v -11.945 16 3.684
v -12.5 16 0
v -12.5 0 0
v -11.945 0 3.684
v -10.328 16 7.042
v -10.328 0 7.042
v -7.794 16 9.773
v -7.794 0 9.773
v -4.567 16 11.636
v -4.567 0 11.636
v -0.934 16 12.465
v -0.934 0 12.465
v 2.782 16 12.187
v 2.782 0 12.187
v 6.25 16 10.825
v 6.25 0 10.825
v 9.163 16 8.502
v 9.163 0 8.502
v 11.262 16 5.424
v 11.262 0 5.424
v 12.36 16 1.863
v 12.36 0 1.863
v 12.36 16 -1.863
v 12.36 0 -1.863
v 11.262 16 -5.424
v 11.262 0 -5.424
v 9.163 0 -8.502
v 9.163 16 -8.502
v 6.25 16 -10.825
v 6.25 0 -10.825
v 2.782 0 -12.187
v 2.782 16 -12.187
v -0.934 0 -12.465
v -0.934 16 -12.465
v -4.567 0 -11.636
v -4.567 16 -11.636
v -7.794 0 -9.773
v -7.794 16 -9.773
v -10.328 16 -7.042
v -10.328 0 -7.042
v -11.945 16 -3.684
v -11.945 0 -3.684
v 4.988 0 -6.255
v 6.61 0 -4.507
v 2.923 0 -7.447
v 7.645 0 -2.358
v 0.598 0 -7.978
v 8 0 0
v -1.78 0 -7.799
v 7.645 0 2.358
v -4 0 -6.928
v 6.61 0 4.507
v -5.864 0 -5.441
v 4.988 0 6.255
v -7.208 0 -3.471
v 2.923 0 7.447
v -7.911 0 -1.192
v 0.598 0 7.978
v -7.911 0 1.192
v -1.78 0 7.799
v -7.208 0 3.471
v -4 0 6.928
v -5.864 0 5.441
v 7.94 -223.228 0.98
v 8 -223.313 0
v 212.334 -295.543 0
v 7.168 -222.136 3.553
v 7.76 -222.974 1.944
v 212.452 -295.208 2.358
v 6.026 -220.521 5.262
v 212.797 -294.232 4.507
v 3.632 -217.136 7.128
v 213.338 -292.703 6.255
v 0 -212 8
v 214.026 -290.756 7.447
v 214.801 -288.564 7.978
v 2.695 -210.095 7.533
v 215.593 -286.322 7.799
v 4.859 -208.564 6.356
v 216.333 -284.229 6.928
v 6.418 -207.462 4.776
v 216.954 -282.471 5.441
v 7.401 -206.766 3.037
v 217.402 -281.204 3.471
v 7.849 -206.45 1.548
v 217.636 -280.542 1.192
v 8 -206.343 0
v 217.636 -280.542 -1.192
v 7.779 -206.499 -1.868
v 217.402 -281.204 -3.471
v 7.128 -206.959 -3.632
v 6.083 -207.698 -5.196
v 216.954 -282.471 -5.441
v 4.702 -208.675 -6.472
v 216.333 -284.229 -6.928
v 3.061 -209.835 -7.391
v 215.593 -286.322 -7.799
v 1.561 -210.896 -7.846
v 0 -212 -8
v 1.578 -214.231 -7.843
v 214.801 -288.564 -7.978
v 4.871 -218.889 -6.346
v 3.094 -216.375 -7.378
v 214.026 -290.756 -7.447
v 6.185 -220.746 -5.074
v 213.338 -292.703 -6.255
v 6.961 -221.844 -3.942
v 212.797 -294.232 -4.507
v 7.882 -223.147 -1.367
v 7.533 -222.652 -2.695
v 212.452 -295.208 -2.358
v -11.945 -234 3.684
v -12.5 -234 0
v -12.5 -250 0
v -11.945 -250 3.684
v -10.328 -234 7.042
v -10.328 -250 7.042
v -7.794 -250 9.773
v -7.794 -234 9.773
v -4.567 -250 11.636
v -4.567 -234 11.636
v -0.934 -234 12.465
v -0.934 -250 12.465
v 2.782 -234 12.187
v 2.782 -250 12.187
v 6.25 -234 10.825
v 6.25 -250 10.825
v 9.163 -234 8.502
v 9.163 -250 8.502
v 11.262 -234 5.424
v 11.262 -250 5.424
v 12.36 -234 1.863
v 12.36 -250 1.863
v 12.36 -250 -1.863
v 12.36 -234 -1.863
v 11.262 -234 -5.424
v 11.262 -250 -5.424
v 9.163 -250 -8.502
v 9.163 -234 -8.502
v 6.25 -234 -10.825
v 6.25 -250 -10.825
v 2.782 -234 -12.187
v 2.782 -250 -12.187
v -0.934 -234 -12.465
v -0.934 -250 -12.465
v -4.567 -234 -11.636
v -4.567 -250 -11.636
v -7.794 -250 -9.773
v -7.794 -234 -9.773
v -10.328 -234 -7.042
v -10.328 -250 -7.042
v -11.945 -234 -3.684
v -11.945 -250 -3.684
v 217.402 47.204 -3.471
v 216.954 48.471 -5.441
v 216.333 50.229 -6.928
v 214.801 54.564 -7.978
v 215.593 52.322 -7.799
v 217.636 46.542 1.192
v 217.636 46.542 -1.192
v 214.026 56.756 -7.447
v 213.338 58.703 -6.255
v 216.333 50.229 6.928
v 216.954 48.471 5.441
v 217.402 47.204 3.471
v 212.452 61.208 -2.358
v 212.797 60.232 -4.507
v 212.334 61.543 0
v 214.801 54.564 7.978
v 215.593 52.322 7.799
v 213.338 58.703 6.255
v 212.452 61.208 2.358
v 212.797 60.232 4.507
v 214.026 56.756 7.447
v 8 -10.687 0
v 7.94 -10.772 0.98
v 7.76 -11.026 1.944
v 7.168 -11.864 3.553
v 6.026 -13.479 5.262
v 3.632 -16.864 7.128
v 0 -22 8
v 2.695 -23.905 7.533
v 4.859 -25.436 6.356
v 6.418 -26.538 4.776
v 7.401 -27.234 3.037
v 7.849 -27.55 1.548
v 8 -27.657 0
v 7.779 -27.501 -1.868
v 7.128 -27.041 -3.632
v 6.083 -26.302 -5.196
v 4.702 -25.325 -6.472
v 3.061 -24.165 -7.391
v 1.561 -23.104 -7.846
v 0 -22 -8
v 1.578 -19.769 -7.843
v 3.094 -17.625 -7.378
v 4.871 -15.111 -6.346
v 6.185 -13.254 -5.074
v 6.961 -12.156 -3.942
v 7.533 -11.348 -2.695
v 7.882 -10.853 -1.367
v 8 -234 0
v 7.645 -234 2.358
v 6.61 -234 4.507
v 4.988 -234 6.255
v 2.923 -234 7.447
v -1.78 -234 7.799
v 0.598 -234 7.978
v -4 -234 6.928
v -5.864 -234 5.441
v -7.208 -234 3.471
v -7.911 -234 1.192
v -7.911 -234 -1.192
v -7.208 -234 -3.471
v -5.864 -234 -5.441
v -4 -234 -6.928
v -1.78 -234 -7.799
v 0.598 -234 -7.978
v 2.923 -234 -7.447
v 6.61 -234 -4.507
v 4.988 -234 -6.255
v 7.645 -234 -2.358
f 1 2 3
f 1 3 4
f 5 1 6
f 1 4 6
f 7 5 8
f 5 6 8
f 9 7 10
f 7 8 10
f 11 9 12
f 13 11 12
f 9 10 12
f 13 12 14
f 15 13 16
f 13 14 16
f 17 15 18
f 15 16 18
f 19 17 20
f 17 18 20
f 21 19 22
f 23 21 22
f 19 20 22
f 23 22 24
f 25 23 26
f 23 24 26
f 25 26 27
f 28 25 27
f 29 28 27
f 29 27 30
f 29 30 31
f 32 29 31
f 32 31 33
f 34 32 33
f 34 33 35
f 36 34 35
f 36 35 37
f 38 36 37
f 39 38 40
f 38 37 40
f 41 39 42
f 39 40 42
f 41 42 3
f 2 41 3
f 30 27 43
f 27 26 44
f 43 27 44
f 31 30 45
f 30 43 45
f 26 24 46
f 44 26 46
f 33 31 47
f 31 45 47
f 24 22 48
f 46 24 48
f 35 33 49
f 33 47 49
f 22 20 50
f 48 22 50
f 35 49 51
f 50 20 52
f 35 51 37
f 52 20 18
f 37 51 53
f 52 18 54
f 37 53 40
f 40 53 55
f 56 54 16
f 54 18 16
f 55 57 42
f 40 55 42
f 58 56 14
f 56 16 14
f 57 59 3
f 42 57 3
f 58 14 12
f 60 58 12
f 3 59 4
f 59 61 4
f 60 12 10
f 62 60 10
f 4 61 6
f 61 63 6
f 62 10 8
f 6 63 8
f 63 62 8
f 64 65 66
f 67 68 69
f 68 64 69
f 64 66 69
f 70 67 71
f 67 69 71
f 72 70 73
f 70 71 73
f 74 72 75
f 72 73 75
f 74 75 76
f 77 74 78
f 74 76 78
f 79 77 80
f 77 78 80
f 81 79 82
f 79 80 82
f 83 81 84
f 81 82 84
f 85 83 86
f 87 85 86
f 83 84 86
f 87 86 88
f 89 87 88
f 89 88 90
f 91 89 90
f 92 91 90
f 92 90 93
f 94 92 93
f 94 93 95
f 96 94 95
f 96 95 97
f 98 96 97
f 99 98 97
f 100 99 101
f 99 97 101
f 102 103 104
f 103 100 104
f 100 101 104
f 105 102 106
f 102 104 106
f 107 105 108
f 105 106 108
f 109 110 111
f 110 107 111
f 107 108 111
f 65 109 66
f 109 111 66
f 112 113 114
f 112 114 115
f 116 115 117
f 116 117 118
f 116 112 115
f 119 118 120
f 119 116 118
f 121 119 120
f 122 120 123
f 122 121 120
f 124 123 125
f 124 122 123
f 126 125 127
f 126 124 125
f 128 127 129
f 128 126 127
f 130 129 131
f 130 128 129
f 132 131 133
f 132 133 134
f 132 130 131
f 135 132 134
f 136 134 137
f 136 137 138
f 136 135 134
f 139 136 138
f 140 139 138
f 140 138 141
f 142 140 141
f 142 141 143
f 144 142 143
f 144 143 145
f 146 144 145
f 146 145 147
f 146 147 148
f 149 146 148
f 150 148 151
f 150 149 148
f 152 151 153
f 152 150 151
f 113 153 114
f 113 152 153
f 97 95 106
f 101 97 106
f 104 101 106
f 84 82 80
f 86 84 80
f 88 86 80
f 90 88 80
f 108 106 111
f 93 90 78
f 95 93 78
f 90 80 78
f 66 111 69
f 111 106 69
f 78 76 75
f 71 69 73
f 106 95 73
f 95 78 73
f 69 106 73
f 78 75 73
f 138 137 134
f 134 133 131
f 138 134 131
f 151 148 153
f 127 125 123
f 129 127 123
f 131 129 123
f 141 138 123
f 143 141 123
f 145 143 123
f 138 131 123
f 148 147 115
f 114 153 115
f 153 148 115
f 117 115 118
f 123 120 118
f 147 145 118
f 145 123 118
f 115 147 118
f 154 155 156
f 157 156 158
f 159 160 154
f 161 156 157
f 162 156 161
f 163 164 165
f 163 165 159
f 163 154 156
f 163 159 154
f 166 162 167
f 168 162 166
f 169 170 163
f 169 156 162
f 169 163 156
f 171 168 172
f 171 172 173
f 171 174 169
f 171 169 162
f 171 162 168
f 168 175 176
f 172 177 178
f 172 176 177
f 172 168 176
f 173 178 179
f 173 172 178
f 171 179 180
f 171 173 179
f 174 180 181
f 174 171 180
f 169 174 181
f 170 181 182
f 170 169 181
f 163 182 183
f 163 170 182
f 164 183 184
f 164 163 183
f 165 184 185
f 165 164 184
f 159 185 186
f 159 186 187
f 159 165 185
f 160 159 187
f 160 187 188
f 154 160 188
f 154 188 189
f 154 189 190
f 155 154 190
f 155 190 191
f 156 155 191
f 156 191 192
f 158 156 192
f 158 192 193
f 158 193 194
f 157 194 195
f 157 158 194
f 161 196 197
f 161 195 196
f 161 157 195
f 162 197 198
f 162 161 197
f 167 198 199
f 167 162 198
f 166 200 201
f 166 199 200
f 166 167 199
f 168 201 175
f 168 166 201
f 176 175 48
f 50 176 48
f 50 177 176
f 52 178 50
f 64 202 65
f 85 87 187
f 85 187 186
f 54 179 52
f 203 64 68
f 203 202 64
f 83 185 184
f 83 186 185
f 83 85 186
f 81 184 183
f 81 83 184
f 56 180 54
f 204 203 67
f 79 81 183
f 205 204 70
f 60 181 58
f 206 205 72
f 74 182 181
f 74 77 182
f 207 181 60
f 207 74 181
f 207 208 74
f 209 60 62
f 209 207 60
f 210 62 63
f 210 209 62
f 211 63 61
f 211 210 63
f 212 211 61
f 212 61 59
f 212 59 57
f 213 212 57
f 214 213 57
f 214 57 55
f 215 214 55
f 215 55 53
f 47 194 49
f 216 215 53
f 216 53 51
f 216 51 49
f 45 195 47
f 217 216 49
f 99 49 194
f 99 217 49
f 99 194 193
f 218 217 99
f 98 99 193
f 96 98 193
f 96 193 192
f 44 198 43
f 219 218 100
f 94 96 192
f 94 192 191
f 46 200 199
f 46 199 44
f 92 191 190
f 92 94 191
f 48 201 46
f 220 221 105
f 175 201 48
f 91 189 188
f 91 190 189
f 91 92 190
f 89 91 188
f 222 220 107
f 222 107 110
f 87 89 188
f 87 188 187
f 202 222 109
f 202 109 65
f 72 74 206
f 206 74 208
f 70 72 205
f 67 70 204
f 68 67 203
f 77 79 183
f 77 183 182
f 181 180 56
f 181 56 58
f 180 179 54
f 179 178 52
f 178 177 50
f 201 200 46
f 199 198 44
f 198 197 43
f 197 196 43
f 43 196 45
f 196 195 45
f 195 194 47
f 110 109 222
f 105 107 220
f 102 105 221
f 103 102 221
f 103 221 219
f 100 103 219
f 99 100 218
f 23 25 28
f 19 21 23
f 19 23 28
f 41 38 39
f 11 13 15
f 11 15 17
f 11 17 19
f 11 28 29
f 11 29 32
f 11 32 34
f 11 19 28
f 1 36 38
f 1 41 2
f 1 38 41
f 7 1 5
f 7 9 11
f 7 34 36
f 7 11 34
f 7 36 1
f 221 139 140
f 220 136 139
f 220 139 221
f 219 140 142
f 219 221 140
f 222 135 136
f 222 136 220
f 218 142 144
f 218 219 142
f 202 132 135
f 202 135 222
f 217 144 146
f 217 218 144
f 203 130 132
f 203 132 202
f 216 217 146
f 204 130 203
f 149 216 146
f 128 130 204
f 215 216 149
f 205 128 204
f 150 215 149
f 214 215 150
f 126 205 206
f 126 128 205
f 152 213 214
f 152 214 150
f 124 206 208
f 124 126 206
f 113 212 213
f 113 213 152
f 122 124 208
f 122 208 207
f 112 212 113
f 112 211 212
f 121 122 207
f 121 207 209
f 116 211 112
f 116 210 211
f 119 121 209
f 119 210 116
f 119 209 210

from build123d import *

# Parameters (mm, degrees)
F0_R     = 8
F1_DEPTH = 234
F2_R     = 12.5
F2_R_2   = 8
F3_DEPTH = 16
F4_R     = 12.5
F5_DEPTH = 16
F7_W     = 95.3162200749
F7_H     = 152.7085006237
F8_DEPTH = 50
F10_R    = 8


with BuildPart() as f1:
    # F0 (on Front) → F1 (new body)
    with BuildSketch(Plane.XZ):
        Circle(F0_R)
    extrude(amount=F1_DEPTH)

    # F2 (on face) → F3 (join)
    with BuildSketch(Plane.XZ.offset(234)):
        Circle(F2_R)
        Circle(F2_R_2, mode=Mode.SUBTRACT)
        Circle(F2_R_2)
    extrude(amount=F3_DEPTH)

    # F4 (on face) → F5 (join)
    with BuildSketch(Plane(origin=(0, 0, 0), x_dir=(-1, 0, 0), z_dir=(0, 1, 0))):
        Circle(F4_R)
    extrude(amount=F5_DEPTH)

    # F7 (on Top) → F8 (cut, symmetric)
    with BuildSketch(Plane.XY):
        with Locations((7.3376540095, -193.3542503119)):
            Rectangle(F7_W, F7_H)
    extrude(amount=F8_DEPTH, both=True, mode=Mode.SUBTRACT)

    # F11: sweep along a path in F6
    with BuildLine(Plane.XY) as f11_path:
        Line((0, -22), (215, 54))
    # F10 (on line) → F11 (sweep)
    with BuildSketch(Plane(origin=(-6.9129439818, -2.4436453145, 0), x_dir=(-0.3332788427, 0.9428283051, 0), z_dir=(0.9428283051, 0.3332788427, 0))):
        with Locations((-20.7422227131, 0)):
            Circle(F10_R)
    sweep(path=f11_path.line)

    # F12: F1 across face


with BuildPart() as f1_1:
    add(f1.part)
    add(f1.part.mirror(Plane.XZ.offset(117)))


solid = f1_1.part
